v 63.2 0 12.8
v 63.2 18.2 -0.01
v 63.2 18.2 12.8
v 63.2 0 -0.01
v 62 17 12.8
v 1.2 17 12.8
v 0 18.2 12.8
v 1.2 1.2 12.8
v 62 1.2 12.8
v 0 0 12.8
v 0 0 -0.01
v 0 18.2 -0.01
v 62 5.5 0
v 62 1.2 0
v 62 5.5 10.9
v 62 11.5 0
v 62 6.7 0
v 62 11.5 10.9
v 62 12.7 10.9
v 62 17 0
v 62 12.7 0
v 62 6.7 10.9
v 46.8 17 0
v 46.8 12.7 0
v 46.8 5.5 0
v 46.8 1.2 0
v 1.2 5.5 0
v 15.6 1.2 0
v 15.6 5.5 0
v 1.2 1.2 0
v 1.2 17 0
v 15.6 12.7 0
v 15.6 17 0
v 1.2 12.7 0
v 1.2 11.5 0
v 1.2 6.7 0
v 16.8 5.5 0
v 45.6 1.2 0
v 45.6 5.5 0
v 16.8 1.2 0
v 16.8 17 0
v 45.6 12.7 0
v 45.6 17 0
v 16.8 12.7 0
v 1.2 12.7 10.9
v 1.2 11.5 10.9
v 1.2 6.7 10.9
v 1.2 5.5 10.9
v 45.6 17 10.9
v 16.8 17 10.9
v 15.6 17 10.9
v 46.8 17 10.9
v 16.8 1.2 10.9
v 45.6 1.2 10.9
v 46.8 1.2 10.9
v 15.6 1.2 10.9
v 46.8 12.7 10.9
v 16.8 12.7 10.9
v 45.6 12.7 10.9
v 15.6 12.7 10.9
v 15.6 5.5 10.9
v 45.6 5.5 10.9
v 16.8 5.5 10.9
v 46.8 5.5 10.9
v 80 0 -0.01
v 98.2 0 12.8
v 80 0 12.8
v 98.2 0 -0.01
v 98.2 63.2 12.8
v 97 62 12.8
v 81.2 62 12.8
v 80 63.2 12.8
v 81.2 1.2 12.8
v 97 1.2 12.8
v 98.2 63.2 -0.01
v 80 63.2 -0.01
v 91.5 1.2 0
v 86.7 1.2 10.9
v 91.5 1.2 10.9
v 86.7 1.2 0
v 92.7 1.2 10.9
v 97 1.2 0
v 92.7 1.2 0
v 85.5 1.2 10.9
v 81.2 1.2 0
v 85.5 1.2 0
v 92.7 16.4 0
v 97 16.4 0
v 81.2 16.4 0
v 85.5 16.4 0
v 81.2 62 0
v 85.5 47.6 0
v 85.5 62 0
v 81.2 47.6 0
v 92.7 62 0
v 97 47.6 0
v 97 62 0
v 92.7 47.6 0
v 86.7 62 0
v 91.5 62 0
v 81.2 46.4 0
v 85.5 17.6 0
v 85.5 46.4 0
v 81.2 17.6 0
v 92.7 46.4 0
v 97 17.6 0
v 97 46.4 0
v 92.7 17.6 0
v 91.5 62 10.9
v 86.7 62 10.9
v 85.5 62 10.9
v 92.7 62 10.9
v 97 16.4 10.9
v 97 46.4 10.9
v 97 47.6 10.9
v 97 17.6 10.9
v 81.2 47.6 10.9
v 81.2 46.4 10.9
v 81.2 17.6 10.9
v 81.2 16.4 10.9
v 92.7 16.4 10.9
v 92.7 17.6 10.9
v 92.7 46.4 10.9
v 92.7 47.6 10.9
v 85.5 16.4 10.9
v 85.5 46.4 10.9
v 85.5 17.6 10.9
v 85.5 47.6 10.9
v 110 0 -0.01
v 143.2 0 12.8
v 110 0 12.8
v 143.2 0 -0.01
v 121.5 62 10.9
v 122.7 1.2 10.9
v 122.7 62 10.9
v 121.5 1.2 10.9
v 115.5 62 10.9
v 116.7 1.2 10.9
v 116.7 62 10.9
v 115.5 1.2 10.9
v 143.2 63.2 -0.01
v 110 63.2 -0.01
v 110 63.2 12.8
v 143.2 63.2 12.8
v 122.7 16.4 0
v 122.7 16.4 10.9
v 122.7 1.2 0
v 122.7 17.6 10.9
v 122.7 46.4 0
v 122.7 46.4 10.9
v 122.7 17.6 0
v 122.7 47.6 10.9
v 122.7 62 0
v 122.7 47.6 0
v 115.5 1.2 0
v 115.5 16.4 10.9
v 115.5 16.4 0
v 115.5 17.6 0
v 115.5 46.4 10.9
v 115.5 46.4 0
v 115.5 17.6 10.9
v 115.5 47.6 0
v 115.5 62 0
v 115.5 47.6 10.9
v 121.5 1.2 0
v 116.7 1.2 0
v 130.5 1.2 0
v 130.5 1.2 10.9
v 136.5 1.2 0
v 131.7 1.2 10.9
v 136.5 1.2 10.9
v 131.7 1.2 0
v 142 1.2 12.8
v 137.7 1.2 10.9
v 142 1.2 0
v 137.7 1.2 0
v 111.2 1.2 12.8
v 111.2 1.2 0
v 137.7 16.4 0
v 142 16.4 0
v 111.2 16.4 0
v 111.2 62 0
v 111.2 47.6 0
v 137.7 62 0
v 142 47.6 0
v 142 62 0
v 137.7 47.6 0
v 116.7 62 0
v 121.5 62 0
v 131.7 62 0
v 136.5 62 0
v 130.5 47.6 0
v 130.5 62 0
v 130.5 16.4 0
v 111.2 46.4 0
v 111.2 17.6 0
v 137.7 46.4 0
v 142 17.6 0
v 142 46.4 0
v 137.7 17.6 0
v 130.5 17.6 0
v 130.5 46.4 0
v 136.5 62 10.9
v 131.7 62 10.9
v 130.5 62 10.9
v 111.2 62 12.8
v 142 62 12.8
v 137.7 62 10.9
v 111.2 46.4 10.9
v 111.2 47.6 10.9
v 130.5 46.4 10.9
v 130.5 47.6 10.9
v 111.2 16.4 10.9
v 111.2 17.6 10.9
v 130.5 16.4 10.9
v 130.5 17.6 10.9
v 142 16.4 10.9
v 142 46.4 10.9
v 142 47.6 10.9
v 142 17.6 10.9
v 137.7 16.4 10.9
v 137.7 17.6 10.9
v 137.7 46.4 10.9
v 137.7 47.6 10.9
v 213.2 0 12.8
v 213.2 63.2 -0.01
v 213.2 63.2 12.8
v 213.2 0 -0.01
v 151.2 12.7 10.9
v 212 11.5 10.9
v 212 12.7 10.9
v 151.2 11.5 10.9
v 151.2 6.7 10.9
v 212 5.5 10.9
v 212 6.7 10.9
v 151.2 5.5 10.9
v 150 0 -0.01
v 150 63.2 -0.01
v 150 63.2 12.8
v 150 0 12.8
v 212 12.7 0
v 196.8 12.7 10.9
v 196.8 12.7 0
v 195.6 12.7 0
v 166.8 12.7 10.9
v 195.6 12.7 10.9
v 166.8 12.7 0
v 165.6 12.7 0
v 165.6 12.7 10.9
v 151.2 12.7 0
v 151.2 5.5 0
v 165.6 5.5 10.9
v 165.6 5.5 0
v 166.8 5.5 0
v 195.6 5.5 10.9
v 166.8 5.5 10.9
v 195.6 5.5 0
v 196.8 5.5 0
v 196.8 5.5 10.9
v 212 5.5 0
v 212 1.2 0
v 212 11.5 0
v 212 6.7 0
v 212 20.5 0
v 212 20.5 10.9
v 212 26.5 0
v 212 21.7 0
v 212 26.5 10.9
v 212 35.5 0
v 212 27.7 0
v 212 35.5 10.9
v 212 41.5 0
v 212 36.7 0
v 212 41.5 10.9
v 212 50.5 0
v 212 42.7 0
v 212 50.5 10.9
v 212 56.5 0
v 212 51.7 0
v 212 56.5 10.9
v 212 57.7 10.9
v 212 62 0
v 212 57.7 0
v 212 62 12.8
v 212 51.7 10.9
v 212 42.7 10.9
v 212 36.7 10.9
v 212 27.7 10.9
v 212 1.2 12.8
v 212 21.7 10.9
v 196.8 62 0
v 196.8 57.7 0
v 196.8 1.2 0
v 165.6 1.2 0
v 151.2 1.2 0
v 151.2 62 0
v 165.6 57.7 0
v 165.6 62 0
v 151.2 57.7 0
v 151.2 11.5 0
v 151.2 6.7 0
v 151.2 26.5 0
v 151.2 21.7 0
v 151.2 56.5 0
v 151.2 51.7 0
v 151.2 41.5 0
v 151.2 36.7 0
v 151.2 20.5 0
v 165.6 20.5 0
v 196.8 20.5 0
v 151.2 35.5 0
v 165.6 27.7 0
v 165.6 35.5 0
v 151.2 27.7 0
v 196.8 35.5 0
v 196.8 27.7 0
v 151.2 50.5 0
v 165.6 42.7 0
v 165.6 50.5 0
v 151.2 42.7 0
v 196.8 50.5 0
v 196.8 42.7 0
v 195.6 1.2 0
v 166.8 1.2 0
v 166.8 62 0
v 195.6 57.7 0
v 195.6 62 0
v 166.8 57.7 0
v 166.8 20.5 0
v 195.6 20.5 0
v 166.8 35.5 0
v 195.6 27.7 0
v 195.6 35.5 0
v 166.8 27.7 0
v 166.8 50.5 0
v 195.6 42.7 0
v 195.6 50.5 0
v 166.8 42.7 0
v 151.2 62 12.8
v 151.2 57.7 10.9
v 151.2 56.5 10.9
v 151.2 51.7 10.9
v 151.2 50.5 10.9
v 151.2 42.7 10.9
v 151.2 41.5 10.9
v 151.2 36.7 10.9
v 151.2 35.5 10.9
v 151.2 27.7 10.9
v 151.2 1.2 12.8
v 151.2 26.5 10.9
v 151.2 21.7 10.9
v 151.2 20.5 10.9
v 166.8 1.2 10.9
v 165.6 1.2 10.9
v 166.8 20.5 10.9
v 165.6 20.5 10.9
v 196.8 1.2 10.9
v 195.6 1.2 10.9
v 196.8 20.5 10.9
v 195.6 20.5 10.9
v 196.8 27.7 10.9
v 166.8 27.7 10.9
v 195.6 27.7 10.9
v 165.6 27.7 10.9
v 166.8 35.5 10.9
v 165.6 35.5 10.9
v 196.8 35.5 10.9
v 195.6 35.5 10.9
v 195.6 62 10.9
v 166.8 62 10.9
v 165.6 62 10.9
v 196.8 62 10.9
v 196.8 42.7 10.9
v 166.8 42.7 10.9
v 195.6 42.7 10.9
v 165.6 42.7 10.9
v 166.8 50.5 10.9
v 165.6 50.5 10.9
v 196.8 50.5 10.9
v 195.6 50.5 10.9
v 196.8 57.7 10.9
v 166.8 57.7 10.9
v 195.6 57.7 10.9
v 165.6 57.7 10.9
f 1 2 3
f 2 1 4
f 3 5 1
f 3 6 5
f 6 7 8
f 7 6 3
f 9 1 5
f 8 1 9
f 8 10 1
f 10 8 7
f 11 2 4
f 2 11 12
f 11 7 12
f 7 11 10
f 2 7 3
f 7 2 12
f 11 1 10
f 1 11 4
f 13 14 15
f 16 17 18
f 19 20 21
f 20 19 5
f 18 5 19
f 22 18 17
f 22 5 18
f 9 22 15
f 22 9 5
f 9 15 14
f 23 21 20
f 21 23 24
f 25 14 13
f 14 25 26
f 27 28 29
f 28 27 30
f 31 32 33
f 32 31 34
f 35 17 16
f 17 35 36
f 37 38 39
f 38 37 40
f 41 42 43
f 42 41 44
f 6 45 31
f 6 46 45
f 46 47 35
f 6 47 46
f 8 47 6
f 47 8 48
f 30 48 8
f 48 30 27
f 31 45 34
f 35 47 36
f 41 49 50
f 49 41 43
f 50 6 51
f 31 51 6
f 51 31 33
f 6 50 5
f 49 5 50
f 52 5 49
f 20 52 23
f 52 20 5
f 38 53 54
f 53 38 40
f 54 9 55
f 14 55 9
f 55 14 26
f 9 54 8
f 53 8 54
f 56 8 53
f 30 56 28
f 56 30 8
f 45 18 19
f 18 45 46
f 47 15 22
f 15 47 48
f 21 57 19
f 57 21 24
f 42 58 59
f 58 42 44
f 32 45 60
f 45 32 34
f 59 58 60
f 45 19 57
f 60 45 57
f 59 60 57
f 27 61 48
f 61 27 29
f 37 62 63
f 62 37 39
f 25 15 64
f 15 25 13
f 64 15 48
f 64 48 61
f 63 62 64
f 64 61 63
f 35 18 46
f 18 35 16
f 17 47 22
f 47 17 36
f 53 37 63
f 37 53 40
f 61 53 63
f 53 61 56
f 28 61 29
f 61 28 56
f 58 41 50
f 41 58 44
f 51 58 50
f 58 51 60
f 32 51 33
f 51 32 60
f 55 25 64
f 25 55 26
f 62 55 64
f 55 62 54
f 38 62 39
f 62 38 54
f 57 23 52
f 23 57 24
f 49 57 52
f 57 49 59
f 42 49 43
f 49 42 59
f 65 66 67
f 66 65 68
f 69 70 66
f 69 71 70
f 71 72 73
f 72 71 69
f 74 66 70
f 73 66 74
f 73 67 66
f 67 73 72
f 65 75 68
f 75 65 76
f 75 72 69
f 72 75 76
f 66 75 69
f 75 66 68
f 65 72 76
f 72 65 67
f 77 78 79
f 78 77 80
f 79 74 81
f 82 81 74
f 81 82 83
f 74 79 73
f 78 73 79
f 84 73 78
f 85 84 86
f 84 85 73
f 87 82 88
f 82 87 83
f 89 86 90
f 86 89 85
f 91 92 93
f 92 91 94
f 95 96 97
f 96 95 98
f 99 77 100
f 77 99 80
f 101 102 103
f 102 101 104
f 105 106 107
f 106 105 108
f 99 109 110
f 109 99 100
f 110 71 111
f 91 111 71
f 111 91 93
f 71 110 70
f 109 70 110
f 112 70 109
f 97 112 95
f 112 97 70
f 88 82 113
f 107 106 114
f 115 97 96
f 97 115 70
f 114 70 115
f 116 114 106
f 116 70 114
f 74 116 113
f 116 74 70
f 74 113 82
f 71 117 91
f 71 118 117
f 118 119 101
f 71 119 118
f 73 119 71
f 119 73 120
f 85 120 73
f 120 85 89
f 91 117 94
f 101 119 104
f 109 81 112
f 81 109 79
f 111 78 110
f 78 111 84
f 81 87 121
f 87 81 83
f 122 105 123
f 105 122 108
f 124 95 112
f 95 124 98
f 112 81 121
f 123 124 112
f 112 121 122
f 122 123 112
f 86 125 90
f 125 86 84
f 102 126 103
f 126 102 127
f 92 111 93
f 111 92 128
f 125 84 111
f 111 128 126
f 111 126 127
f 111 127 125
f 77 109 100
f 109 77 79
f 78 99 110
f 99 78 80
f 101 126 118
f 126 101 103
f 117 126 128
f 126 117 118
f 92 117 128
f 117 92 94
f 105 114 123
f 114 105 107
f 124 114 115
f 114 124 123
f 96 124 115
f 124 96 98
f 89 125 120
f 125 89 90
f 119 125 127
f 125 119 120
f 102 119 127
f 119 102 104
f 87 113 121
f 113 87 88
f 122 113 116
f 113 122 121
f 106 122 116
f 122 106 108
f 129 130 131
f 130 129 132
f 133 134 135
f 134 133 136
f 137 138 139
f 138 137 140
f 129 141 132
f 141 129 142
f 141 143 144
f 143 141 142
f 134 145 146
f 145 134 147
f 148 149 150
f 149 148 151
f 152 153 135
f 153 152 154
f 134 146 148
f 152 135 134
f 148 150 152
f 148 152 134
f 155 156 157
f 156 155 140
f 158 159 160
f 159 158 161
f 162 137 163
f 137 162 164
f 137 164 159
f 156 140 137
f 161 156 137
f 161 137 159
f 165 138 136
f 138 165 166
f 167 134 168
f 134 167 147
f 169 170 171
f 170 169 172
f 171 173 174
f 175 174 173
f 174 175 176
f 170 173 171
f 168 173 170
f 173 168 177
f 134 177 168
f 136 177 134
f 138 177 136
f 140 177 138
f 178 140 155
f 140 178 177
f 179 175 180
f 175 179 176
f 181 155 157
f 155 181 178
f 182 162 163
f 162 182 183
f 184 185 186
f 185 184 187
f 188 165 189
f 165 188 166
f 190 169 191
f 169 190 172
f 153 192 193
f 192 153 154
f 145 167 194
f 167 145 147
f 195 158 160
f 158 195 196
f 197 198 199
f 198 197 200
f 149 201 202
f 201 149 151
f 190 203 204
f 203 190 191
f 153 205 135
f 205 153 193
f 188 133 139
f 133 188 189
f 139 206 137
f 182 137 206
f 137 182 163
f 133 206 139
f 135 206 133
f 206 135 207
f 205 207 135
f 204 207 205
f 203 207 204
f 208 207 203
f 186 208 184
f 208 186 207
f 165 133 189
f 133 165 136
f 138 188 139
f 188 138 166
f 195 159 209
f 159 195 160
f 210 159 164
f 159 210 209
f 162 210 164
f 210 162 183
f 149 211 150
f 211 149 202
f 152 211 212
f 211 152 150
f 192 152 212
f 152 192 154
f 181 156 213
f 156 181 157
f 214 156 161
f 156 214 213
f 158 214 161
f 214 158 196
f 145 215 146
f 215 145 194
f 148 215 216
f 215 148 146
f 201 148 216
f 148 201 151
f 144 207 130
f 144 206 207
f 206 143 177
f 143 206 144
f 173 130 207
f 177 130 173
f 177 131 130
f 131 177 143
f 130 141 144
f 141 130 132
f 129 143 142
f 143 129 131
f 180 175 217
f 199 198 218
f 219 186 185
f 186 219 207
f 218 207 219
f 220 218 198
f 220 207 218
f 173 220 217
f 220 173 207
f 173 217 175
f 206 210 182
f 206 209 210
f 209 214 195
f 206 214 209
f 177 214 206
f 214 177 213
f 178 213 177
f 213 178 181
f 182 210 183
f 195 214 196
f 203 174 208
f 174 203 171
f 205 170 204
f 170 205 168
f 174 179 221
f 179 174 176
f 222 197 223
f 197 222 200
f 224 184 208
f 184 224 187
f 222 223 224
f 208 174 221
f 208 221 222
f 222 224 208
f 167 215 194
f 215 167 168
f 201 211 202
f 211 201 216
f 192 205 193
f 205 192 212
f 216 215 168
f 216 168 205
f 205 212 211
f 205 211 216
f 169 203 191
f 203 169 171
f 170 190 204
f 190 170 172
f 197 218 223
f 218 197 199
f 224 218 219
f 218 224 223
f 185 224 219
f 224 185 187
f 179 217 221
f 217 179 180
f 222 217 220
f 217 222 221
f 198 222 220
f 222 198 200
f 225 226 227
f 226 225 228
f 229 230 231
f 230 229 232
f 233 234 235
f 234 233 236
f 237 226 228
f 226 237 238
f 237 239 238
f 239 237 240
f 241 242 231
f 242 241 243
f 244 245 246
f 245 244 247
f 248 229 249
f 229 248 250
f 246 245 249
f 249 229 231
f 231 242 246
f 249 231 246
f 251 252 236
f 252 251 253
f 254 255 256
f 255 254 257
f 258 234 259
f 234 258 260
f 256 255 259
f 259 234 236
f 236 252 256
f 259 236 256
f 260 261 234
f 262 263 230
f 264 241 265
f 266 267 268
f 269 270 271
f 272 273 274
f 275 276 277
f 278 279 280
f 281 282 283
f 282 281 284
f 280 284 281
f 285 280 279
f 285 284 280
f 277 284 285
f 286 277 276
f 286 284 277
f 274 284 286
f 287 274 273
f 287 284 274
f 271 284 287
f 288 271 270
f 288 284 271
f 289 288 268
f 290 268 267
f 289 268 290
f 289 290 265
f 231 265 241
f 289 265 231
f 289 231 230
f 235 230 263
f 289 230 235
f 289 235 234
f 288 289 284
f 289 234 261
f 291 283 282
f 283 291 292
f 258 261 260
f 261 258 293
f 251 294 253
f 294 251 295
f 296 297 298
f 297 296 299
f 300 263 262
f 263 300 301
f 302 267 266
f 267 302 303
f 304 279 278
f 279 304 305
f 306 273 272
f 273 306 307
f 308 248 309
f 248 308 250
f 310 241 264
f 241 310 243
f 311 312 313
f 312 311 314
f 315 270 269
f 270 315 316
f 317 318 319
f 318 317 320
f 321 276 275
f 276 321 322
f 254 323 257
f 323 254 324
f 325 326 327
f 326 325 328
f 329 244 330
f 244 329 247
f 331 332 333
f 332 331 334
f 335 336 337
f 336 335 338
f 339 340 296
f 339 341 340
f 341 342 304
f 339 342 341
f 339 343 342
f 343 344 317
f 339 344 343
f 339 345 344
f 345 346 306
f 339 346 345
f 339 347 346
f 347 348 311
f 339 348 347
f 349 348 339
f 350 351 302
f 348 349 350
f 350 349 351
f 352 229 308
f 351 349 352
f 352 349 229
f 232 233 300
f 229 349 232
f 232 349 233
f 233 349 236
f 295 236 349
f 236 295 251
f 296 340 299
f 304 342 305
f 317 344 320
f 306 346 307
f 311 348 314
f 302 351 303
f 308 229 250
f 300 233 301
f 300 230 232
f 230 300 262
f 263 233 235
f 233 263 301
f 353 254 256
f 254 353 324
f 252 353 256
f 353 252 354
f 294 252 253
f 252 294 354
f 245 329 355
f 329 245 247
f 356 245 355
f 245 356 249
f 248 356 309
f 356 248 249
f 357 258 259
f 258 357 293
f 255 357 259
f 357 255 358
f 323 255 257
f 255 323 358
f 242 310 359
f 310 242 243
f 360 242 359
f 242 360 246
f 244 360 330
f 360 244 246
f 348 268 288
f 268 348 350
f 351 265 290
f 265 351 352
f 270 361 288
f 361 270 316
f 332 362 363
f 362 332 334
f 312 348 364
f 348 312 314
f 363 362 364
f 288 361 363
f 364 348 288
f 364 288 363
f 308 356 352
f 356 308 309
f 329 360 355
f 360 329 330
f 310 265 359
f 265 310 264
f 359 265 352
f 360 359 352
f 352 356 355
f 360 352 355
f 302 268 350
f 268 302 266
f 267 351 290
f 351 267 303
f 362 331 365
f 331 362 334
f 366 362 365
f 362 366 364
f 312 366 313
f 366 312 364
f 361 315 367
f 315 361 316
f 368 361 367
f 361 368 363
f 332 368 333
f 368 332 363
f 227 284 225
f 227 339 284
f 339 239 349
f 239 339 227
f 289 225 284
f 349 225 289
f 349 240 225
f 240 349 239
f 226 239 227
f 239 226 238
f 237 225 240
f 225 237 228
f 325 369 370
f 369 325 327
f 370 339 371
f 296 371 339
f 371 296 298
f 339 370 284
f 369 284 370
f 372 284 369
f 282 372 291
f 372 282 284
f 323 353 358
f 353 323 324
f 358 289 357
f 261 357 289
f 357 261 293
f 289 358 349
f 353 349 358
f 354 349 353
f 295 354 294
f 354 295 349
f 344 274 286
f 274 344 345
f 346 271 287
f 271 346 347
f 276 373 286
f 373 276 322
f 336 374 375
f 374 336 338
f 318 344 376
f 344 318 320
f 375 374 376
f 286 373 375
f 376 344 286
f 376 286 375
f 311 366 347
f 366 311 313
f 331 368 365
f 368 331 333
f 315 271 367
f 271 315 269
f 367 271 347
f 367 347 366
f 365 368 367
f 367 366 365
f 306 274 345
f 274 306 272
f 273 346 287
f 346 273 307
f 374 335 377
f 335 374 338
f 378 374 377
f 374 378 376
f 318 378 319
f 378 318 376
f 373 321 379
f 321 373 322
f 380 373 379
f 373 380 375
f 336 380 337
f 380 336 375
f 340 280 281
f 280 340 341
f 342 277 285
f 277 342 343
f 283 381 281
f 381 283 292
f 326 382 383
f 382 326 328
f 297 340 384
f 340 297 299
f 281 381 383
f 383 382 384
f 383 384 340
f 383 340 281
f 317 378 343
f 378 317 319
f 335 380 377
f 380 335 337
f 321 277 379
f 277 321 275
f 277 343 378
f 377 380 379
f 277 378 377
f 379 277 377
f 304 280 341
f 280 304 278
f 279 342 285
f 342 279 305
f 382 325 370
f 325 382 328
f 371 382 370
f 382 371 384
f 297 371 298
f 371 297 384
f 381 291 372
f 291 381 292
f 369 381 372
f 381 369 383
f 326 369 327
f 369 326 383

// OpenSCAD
// file: ../../Base/Boxes.scad
// Fischertechnik Box Foundation
// Pre-designed Boxes

use <Constants.scad>

include <PlacementOptions.scad>

box190Width = 190;
box190Depth = 130;
box130Width = 130;
box130Depth = 95;
boxUsageHeight = 33.9;
boxWallThickness = 2.4;
boxBaseThickness = 1.0;

// getBoxWallThickness()
// Gets the wall thickness of a Fischertechnik Box

function getBoxWallThickness() = boxWallThickness;

// Gets the usable height of a fischertechnik box
function getBoxUsageHeight() = boxUsageHeight;

// Gets the thickness of the Fischertechnik box base.
function getBoxBaseThickness() = boxBaseThickness;

// Gets the usable inner space of a Box 190 as an x/y-list
function getBox190Space() = [
    box190Width - 2*getBoxWallThickness(), 
    box190Depth - 2*getBoxWallThickness() ];

// Imports the Fischertechnik empty box 130x190 mm and places it at position 0,0
// 190x130 are the outer sizes, the inner space is slightly smaller. Use getBox190Space() to get the inner sizes.
// This module needs the STL file "Fischertechnik Box 130x190.stl" in the library path.
// The box is positioned that the usable inner space is at the 0,0,0 position. The

module Box190() {
    translate([-getBoxWallThickness(),-getBoxWallThickness(),-getBoxBaseThickness()])
        import("Fischertechnik Box 130x190.stl", convexity=3);
}

// Gets the usable inner space of a Box 130 as an x/y-list
function getBox130Space() = [
    box130Width - 2*getBoxWallThickness(), 
    box130Depth - 2*getBoxWallThickness() ];

// Imports the Fischertechnik empty box 95x130 mm and places it at position 0,0
// 190x130 are the outer sizes, the inner space is slightly smaller. Use getBox190Space() to get the inner sizes.
// This module needs the STL file "Fischertechnik Box 95x130.stl" in the library path.
// The box is positioned that the usable inner space is at the 0,0,0 position. The

module Box130() {
    translate([-getBoxWallThickness(),-getBoxWallThickness(),-getBoxBaseThickness()])
        import("Fischertechnik Box 95x130.stl", convexity=3);
}

// Creates a web at the specified box walls
// corner 0 = LowerLeft, 1 = UpperLeft, 2 = UpperRight, 3 = LowerRight
// side 0 = LeftOfCorner, 1 = RightOfCorner
// distance = Distance in mm from the corner
// box = inner width and depth of the box (default: Box 190)
// webWidth = length of the web (default is 3 mms)
// webThickness = thickness of the web (default is 1 mm)

module BoxWeb(corner, side, distance, box=getBox190Space(), webWidth=3, webThickness=1.0) {
    sink = getBoxWallThickness()/2;

    width = (corner % 2 == 0) ? 
            (side == LeftOfCorner ? webWidth : webThickness) :
            (side == LeftOfCorner ? webThickness : webWidth);

    depth = (corner % 2 == 0) ? 
            (side == RightOfCorner ? webWidth : webThickness) :
            (side == RightOfCorner ? webThickness : webWidth);
    
    xDiff = corner == LowerLeft ? 
                (side == LeftOfCorner ? -sink : distance) :
            (corner == UpperLeft ?                
                (side == LeftOfCorner ? distance : -sink) :
            (corner == UpperRight ?
                (side == LeftOfCorner ? box.x-webWidth+sink : box.x-distance-webThickness) :
                (side == LeftOfCorner ? box.x-distance-webThickness: box.x-webWidth+sink)));

    yDiff = corner == LowerLeft ? 
                (side == RightOfCorner ? -sink : distance) :
            (corner == UpperLeft ?
                (side == RightOfCorner ? box.y-distance : box.y-webWidth+sink) :
            (corner == UpperRight ?
                (side == RightOfCorner ? box.y-webWidth+sink : box.y-distance) :
                (side == RightOfCorner ? distance : -sink)));
    
    translate([xDiff, yDiff, -getExcess()])
        cube([width, depth, boxUsageHeight + 2*getExcess()]);
}
// file: ../../Base/Rotation.scad
// Fischertechnik Box Foundation
// Geometry Helpers Rotation

include <PlacementOptions.scad>

// getRotatedSpace(space, rotation=NoRotation)
// Rotates the space dependent on the specified rotation

function getRotatedSpace(space, rotation=NoRotation) = [
    (rotation == Rotate90 || rotation == Rotate270) ? space.y : space.x,
    (rotation == Rotate90 || rotation == Rotate270) ? space.x : space.y
];

// Rotates the given space around the fixed left lower corner
// space = the space the children needs as width/depth list [width,depth]
// rotation = 0 Rotate0 degrees, 1 Rotate90 degrees, 2 Rotate180 degrees, 3 Rotate270 degrees (equivalent to -90)

module RotateFix(space, rotation=Rotate0) {
    dy = (rotation == Rotate0 || rotation == Rotate270) ? 0 :
        (rotation == Rotate90) ? space.x :
        space.y;
    dx = (rotation < Rotate180) ? 0 :
        (rotation == Rotate180) ? space.x :
        space.y;
    
    translate([dx, dy, 0])
        rotate([0, 0, rotations[rotation]])
            children();
}
// file: ../../Base/Alignment.scad
// Fischertechnik Box Foundation
// Geometry Helpers Alignment

include <PlacementOptions.scad>

// getAlignedX(elementWidth, spaceWidth, align=AlignRight, offset=0)
// Gets the aligned X offset of an element with the given
// width in the given space.
// elementWidth = The width of the element to positon
// spaceWidth = The space where the element should be aligned
// align = 0 AlignLeft, 1 AlignCenter, 2 AlignRight
// offset = an optional offset from the aligned position. When
// aligned left or centered, then positive values are in X direction.
// When aligned right then positive values are in negative X direction.

function getAlignedX(elementWidth, spaceWidth, align=AlignRight, offset=0) =
    (align == AlignLeft) ?
        offset :
        ((align == AlignCenter) ?
        (spaceWidth - elementWidth)/2 + offset :
        spaceWidth - offset - elementWidth);

// getAlignedY(elementDepth, spaceDepth, align=AlignTop, offset=0)
// Gets the aligned Y offset of an element with the given
// depth in the given space.
// elementDepth = The depth of the element to positon
// spaceDepth = The space where the element should be aligned
// align = 0 AlignBottom, 1 AlignCenter, 2 AlignTop
// offset = an optional offset from the aligned position. When
// aligned bottom or centered, then positive values are in Y direction.
// When aligned top then positive values are in negative Y direction.

function getAlignedY(elementDepth, spaceDepth, align=AlignTop, offset=0) =
    (align == AlignBottom) ?
        offset :
        ((align == AlignCenter) ?
        (spaceDepth - elementDepth)/2 + offset :
        spaceDepth - offset - elementDepth);
// file: ../../Base/Constants.scad
// Fischertechnik Box Foundation
// Constants

// Constant values necessary for multiple elements

// Base constants
dividerThickness = 1.2;
excess = 0.01;
fragments = 90;
tolerance = 0.8;

// Gets the thickness of a divider 
function getDividerThickness() = dividerThickness;

// Gets the excess that is used to merge walls into each other
function getExcess() = excess;

// Gets amount of fragments of a cylinder
function getFragments() = fragments;

// Gets the inner tolerance of a frame to each side
function getTolerance() = tolerance;


// Fischertechnik specific constants
axisDiameter = 4;
axisBottomDiameter = axisDiameter + 1;
standardEdgeDistance = 2.5;
standardWebDistance = 11.5;
standardCornerLength = 15;
tubeWallFactor = 1.6;

// Gets axis diameter
function getAxisDiameter() = axisDiameter;

// Gets axis bottom diameter for thicker part at the bottom
function getAxisBottomDiameter() = axisBottomDiameter;

// gets the standard distance to the wall of the box for dockable frames with webs
function getStandardEdgeDistance() = standardEdgeDistance;

// gets the standard distance of each web to the corner of the dockable frame
function getStandardWebDistance() = standardWebDistance;

// gets the standard length of the corner walls of a dockable frame
function getStandardCornerLength() = standardCornerLength;

// gets the wall thickness of a tube.
function getTubeWallThickness() = tubeWallFactor * getDividerThickness();
// file: ../../Base/PlacementOptions.scad
// Fischertechnik Box Foundation
// Placement Options

// Alignment
NoAlign = 0;
AlignLeft = 1;
AlignBottom = 2;
AlignCenter = 3;
AlignRight = 4;
AlignTop = 5;

// Element rotation degree steps
rotations = [0, -90, -180, -270];

// Rotation
NoRotation = 0;
Rotate0 = 0;
Rotate90 = 1;
Rotate180 = 2;
Rotate270 = 3;

// Docking (seen from above)
NoDock = -1;
DockLeft = 0;
DockTop = 1;
DockRight = 2;
DockCorner = 2;
DockBottom = 3;

// Web corners
LowerLeft = 0;
UpperLeft = 1;
UpperRight = 2;
LowerRight = 3;

// Web position relative to corner
LeftOfCorner = 0;
RightOfCorner = 1;
// file: ../../Elements/FrameRack60.scad
// Fischertechnik Box Library
// Frame for Rack 60
// 31053

use <../Base/Constants.scad>
use <../ModelBase/Complex.scad>

width = 30;
depth = 15;
height = 12.8;
factor = 2;

// getFrameRack60Space(count=1)
// Gets the space for a frame for count racks 60 in one row.

function getFrameRack60Space(count=1) = getFrameRackSpace(factor, count);

// FrameRack(count)
// Frame for rack 60. The racks 30 are ordered in line.
// A frame for two racks 30 is identical to a single frame for a rack 60.
// count = Count of racks

module FrameRack60(count=1) {
    FrameRack(factor, count);
}

// Test
color("lightgray")
FrameRack60(1);
// file: ../../Base/Placement.scad
// Fischertechnik Box Foundation
// Geometry Helpers Placement

use <Constants.scad>
use <Alignment.scad>
use <Rotation.scad>
use <Boxes.scad>

include <PlacementOptions.scad>

// Place(x=0, y=0, elementSpace=[0,0], alignX=AlignLeft, alignY=AlignBottom, rotation=Rotate0, boxSpace=getBox190Space())
// Places the child at the specified position
// y = Y-Position. This is a relative position when an X aligment is specified.
// x = X-Position. This is a relative position when an Y aligment is specified.
// elementSpace = space of the element to be placed [x,y]
// alignX = -1=NoAlign, 0 AlignLeft, 1 AlignCenter, 3 AlignRight (elementSpace and boxSpace required!)
// alignY = -1=NoAlign, 2 AlignBottom, 1 AlignCenter, 4 AlignTop (elementSpace and boxSpace required!)
// rotation = 0 Rotate0 0 degrees, 1 Rotate90 90 degrees, 
// 2 Rotate180 180 degrees, 3 Rotate270 270 degrees (equivalent to -90)
// boxSpace = Inner space of the box where the placement occurs [x,y] - default is Box 190x130 inner space

module Place(x=0, y=0, elementSpace=[0,0], 
  alignX=AlignLeft, alignY=AlignBottom, 
  rotation=NoRotation, boxSpace=getBox190Space()) {

    module Position(x, y, space, rotation=Rotate0) {
        translate([x, y, 0])
            RotateFix(space, rotation)
                children(0);
    }

    space = getRotatedSpace(elementSpace, rotation);
    alignedX = getAlignedX(space.x, boxSpace.x, alignX, x);
    alignedY = getAlignedY(space.y, boxSpace.y, alignY, y);
    Position(alignedX, alignedY, elementSpace, rotation)
        children(0);
}

// Center(space=getBox130Space(), elementSpace=[0,0])
// space = Space where the children is centered. For cylinder use centered=true and no elementSpace.
// elementSpace = space of the element to be centered [x,y]

module Center(space=getBox190Space(), elementSpace=[0,0]) {
    translate([(space.x - elementSpace.x) / 2, (space.y - elementSpace.y) / 2])
        children(0);
}

// CenterHorizontal(width=0, y=0, offset=0, space=getBox130Space())
// space = Space where the children is centered. For cylinder use centered=true and no elementSpace.
// elementSpace = space of the element to be centered [x,y]

module CenterHorizontal(width=0, y=0, offset=0, space=getBox190Space()) {
    translate([(space.x - width) / 2 + offset, y])
        children(0);
}

// CenterVertical(depth=0, x=0, offset=0, space=getBox130Space())
// space = Space where the children is centered. For cylinder use centered=true and no elementSpace.
// elementSpace = space of the element to be centered [x,y]

module CenterVerticalal(depth=0, x=0, offset=0, space=getBox190Space()) {
    translate([x, (space.y - depth) / 2 + offset])
        children(0);
}
// main file
// Fischertechnik Box Foundation
// Elements
// Test FrameRack60

use <../../Base/Placement.scad>
use <../../Elements/FrameRack60.scad>

include <../../Base/PlacementOptions.scad>

FrameRack60();

Place(80, 0, getFrameRack60Space(), rotation=Rotate90)
    FrameRack60();

Place(110, 0, getFrameRack60Space(2), rotation=Rotate90)
    FrameRack60(2);

Place(150, 0, getFrameRack60Space(4))
    FrameRack60(4);
